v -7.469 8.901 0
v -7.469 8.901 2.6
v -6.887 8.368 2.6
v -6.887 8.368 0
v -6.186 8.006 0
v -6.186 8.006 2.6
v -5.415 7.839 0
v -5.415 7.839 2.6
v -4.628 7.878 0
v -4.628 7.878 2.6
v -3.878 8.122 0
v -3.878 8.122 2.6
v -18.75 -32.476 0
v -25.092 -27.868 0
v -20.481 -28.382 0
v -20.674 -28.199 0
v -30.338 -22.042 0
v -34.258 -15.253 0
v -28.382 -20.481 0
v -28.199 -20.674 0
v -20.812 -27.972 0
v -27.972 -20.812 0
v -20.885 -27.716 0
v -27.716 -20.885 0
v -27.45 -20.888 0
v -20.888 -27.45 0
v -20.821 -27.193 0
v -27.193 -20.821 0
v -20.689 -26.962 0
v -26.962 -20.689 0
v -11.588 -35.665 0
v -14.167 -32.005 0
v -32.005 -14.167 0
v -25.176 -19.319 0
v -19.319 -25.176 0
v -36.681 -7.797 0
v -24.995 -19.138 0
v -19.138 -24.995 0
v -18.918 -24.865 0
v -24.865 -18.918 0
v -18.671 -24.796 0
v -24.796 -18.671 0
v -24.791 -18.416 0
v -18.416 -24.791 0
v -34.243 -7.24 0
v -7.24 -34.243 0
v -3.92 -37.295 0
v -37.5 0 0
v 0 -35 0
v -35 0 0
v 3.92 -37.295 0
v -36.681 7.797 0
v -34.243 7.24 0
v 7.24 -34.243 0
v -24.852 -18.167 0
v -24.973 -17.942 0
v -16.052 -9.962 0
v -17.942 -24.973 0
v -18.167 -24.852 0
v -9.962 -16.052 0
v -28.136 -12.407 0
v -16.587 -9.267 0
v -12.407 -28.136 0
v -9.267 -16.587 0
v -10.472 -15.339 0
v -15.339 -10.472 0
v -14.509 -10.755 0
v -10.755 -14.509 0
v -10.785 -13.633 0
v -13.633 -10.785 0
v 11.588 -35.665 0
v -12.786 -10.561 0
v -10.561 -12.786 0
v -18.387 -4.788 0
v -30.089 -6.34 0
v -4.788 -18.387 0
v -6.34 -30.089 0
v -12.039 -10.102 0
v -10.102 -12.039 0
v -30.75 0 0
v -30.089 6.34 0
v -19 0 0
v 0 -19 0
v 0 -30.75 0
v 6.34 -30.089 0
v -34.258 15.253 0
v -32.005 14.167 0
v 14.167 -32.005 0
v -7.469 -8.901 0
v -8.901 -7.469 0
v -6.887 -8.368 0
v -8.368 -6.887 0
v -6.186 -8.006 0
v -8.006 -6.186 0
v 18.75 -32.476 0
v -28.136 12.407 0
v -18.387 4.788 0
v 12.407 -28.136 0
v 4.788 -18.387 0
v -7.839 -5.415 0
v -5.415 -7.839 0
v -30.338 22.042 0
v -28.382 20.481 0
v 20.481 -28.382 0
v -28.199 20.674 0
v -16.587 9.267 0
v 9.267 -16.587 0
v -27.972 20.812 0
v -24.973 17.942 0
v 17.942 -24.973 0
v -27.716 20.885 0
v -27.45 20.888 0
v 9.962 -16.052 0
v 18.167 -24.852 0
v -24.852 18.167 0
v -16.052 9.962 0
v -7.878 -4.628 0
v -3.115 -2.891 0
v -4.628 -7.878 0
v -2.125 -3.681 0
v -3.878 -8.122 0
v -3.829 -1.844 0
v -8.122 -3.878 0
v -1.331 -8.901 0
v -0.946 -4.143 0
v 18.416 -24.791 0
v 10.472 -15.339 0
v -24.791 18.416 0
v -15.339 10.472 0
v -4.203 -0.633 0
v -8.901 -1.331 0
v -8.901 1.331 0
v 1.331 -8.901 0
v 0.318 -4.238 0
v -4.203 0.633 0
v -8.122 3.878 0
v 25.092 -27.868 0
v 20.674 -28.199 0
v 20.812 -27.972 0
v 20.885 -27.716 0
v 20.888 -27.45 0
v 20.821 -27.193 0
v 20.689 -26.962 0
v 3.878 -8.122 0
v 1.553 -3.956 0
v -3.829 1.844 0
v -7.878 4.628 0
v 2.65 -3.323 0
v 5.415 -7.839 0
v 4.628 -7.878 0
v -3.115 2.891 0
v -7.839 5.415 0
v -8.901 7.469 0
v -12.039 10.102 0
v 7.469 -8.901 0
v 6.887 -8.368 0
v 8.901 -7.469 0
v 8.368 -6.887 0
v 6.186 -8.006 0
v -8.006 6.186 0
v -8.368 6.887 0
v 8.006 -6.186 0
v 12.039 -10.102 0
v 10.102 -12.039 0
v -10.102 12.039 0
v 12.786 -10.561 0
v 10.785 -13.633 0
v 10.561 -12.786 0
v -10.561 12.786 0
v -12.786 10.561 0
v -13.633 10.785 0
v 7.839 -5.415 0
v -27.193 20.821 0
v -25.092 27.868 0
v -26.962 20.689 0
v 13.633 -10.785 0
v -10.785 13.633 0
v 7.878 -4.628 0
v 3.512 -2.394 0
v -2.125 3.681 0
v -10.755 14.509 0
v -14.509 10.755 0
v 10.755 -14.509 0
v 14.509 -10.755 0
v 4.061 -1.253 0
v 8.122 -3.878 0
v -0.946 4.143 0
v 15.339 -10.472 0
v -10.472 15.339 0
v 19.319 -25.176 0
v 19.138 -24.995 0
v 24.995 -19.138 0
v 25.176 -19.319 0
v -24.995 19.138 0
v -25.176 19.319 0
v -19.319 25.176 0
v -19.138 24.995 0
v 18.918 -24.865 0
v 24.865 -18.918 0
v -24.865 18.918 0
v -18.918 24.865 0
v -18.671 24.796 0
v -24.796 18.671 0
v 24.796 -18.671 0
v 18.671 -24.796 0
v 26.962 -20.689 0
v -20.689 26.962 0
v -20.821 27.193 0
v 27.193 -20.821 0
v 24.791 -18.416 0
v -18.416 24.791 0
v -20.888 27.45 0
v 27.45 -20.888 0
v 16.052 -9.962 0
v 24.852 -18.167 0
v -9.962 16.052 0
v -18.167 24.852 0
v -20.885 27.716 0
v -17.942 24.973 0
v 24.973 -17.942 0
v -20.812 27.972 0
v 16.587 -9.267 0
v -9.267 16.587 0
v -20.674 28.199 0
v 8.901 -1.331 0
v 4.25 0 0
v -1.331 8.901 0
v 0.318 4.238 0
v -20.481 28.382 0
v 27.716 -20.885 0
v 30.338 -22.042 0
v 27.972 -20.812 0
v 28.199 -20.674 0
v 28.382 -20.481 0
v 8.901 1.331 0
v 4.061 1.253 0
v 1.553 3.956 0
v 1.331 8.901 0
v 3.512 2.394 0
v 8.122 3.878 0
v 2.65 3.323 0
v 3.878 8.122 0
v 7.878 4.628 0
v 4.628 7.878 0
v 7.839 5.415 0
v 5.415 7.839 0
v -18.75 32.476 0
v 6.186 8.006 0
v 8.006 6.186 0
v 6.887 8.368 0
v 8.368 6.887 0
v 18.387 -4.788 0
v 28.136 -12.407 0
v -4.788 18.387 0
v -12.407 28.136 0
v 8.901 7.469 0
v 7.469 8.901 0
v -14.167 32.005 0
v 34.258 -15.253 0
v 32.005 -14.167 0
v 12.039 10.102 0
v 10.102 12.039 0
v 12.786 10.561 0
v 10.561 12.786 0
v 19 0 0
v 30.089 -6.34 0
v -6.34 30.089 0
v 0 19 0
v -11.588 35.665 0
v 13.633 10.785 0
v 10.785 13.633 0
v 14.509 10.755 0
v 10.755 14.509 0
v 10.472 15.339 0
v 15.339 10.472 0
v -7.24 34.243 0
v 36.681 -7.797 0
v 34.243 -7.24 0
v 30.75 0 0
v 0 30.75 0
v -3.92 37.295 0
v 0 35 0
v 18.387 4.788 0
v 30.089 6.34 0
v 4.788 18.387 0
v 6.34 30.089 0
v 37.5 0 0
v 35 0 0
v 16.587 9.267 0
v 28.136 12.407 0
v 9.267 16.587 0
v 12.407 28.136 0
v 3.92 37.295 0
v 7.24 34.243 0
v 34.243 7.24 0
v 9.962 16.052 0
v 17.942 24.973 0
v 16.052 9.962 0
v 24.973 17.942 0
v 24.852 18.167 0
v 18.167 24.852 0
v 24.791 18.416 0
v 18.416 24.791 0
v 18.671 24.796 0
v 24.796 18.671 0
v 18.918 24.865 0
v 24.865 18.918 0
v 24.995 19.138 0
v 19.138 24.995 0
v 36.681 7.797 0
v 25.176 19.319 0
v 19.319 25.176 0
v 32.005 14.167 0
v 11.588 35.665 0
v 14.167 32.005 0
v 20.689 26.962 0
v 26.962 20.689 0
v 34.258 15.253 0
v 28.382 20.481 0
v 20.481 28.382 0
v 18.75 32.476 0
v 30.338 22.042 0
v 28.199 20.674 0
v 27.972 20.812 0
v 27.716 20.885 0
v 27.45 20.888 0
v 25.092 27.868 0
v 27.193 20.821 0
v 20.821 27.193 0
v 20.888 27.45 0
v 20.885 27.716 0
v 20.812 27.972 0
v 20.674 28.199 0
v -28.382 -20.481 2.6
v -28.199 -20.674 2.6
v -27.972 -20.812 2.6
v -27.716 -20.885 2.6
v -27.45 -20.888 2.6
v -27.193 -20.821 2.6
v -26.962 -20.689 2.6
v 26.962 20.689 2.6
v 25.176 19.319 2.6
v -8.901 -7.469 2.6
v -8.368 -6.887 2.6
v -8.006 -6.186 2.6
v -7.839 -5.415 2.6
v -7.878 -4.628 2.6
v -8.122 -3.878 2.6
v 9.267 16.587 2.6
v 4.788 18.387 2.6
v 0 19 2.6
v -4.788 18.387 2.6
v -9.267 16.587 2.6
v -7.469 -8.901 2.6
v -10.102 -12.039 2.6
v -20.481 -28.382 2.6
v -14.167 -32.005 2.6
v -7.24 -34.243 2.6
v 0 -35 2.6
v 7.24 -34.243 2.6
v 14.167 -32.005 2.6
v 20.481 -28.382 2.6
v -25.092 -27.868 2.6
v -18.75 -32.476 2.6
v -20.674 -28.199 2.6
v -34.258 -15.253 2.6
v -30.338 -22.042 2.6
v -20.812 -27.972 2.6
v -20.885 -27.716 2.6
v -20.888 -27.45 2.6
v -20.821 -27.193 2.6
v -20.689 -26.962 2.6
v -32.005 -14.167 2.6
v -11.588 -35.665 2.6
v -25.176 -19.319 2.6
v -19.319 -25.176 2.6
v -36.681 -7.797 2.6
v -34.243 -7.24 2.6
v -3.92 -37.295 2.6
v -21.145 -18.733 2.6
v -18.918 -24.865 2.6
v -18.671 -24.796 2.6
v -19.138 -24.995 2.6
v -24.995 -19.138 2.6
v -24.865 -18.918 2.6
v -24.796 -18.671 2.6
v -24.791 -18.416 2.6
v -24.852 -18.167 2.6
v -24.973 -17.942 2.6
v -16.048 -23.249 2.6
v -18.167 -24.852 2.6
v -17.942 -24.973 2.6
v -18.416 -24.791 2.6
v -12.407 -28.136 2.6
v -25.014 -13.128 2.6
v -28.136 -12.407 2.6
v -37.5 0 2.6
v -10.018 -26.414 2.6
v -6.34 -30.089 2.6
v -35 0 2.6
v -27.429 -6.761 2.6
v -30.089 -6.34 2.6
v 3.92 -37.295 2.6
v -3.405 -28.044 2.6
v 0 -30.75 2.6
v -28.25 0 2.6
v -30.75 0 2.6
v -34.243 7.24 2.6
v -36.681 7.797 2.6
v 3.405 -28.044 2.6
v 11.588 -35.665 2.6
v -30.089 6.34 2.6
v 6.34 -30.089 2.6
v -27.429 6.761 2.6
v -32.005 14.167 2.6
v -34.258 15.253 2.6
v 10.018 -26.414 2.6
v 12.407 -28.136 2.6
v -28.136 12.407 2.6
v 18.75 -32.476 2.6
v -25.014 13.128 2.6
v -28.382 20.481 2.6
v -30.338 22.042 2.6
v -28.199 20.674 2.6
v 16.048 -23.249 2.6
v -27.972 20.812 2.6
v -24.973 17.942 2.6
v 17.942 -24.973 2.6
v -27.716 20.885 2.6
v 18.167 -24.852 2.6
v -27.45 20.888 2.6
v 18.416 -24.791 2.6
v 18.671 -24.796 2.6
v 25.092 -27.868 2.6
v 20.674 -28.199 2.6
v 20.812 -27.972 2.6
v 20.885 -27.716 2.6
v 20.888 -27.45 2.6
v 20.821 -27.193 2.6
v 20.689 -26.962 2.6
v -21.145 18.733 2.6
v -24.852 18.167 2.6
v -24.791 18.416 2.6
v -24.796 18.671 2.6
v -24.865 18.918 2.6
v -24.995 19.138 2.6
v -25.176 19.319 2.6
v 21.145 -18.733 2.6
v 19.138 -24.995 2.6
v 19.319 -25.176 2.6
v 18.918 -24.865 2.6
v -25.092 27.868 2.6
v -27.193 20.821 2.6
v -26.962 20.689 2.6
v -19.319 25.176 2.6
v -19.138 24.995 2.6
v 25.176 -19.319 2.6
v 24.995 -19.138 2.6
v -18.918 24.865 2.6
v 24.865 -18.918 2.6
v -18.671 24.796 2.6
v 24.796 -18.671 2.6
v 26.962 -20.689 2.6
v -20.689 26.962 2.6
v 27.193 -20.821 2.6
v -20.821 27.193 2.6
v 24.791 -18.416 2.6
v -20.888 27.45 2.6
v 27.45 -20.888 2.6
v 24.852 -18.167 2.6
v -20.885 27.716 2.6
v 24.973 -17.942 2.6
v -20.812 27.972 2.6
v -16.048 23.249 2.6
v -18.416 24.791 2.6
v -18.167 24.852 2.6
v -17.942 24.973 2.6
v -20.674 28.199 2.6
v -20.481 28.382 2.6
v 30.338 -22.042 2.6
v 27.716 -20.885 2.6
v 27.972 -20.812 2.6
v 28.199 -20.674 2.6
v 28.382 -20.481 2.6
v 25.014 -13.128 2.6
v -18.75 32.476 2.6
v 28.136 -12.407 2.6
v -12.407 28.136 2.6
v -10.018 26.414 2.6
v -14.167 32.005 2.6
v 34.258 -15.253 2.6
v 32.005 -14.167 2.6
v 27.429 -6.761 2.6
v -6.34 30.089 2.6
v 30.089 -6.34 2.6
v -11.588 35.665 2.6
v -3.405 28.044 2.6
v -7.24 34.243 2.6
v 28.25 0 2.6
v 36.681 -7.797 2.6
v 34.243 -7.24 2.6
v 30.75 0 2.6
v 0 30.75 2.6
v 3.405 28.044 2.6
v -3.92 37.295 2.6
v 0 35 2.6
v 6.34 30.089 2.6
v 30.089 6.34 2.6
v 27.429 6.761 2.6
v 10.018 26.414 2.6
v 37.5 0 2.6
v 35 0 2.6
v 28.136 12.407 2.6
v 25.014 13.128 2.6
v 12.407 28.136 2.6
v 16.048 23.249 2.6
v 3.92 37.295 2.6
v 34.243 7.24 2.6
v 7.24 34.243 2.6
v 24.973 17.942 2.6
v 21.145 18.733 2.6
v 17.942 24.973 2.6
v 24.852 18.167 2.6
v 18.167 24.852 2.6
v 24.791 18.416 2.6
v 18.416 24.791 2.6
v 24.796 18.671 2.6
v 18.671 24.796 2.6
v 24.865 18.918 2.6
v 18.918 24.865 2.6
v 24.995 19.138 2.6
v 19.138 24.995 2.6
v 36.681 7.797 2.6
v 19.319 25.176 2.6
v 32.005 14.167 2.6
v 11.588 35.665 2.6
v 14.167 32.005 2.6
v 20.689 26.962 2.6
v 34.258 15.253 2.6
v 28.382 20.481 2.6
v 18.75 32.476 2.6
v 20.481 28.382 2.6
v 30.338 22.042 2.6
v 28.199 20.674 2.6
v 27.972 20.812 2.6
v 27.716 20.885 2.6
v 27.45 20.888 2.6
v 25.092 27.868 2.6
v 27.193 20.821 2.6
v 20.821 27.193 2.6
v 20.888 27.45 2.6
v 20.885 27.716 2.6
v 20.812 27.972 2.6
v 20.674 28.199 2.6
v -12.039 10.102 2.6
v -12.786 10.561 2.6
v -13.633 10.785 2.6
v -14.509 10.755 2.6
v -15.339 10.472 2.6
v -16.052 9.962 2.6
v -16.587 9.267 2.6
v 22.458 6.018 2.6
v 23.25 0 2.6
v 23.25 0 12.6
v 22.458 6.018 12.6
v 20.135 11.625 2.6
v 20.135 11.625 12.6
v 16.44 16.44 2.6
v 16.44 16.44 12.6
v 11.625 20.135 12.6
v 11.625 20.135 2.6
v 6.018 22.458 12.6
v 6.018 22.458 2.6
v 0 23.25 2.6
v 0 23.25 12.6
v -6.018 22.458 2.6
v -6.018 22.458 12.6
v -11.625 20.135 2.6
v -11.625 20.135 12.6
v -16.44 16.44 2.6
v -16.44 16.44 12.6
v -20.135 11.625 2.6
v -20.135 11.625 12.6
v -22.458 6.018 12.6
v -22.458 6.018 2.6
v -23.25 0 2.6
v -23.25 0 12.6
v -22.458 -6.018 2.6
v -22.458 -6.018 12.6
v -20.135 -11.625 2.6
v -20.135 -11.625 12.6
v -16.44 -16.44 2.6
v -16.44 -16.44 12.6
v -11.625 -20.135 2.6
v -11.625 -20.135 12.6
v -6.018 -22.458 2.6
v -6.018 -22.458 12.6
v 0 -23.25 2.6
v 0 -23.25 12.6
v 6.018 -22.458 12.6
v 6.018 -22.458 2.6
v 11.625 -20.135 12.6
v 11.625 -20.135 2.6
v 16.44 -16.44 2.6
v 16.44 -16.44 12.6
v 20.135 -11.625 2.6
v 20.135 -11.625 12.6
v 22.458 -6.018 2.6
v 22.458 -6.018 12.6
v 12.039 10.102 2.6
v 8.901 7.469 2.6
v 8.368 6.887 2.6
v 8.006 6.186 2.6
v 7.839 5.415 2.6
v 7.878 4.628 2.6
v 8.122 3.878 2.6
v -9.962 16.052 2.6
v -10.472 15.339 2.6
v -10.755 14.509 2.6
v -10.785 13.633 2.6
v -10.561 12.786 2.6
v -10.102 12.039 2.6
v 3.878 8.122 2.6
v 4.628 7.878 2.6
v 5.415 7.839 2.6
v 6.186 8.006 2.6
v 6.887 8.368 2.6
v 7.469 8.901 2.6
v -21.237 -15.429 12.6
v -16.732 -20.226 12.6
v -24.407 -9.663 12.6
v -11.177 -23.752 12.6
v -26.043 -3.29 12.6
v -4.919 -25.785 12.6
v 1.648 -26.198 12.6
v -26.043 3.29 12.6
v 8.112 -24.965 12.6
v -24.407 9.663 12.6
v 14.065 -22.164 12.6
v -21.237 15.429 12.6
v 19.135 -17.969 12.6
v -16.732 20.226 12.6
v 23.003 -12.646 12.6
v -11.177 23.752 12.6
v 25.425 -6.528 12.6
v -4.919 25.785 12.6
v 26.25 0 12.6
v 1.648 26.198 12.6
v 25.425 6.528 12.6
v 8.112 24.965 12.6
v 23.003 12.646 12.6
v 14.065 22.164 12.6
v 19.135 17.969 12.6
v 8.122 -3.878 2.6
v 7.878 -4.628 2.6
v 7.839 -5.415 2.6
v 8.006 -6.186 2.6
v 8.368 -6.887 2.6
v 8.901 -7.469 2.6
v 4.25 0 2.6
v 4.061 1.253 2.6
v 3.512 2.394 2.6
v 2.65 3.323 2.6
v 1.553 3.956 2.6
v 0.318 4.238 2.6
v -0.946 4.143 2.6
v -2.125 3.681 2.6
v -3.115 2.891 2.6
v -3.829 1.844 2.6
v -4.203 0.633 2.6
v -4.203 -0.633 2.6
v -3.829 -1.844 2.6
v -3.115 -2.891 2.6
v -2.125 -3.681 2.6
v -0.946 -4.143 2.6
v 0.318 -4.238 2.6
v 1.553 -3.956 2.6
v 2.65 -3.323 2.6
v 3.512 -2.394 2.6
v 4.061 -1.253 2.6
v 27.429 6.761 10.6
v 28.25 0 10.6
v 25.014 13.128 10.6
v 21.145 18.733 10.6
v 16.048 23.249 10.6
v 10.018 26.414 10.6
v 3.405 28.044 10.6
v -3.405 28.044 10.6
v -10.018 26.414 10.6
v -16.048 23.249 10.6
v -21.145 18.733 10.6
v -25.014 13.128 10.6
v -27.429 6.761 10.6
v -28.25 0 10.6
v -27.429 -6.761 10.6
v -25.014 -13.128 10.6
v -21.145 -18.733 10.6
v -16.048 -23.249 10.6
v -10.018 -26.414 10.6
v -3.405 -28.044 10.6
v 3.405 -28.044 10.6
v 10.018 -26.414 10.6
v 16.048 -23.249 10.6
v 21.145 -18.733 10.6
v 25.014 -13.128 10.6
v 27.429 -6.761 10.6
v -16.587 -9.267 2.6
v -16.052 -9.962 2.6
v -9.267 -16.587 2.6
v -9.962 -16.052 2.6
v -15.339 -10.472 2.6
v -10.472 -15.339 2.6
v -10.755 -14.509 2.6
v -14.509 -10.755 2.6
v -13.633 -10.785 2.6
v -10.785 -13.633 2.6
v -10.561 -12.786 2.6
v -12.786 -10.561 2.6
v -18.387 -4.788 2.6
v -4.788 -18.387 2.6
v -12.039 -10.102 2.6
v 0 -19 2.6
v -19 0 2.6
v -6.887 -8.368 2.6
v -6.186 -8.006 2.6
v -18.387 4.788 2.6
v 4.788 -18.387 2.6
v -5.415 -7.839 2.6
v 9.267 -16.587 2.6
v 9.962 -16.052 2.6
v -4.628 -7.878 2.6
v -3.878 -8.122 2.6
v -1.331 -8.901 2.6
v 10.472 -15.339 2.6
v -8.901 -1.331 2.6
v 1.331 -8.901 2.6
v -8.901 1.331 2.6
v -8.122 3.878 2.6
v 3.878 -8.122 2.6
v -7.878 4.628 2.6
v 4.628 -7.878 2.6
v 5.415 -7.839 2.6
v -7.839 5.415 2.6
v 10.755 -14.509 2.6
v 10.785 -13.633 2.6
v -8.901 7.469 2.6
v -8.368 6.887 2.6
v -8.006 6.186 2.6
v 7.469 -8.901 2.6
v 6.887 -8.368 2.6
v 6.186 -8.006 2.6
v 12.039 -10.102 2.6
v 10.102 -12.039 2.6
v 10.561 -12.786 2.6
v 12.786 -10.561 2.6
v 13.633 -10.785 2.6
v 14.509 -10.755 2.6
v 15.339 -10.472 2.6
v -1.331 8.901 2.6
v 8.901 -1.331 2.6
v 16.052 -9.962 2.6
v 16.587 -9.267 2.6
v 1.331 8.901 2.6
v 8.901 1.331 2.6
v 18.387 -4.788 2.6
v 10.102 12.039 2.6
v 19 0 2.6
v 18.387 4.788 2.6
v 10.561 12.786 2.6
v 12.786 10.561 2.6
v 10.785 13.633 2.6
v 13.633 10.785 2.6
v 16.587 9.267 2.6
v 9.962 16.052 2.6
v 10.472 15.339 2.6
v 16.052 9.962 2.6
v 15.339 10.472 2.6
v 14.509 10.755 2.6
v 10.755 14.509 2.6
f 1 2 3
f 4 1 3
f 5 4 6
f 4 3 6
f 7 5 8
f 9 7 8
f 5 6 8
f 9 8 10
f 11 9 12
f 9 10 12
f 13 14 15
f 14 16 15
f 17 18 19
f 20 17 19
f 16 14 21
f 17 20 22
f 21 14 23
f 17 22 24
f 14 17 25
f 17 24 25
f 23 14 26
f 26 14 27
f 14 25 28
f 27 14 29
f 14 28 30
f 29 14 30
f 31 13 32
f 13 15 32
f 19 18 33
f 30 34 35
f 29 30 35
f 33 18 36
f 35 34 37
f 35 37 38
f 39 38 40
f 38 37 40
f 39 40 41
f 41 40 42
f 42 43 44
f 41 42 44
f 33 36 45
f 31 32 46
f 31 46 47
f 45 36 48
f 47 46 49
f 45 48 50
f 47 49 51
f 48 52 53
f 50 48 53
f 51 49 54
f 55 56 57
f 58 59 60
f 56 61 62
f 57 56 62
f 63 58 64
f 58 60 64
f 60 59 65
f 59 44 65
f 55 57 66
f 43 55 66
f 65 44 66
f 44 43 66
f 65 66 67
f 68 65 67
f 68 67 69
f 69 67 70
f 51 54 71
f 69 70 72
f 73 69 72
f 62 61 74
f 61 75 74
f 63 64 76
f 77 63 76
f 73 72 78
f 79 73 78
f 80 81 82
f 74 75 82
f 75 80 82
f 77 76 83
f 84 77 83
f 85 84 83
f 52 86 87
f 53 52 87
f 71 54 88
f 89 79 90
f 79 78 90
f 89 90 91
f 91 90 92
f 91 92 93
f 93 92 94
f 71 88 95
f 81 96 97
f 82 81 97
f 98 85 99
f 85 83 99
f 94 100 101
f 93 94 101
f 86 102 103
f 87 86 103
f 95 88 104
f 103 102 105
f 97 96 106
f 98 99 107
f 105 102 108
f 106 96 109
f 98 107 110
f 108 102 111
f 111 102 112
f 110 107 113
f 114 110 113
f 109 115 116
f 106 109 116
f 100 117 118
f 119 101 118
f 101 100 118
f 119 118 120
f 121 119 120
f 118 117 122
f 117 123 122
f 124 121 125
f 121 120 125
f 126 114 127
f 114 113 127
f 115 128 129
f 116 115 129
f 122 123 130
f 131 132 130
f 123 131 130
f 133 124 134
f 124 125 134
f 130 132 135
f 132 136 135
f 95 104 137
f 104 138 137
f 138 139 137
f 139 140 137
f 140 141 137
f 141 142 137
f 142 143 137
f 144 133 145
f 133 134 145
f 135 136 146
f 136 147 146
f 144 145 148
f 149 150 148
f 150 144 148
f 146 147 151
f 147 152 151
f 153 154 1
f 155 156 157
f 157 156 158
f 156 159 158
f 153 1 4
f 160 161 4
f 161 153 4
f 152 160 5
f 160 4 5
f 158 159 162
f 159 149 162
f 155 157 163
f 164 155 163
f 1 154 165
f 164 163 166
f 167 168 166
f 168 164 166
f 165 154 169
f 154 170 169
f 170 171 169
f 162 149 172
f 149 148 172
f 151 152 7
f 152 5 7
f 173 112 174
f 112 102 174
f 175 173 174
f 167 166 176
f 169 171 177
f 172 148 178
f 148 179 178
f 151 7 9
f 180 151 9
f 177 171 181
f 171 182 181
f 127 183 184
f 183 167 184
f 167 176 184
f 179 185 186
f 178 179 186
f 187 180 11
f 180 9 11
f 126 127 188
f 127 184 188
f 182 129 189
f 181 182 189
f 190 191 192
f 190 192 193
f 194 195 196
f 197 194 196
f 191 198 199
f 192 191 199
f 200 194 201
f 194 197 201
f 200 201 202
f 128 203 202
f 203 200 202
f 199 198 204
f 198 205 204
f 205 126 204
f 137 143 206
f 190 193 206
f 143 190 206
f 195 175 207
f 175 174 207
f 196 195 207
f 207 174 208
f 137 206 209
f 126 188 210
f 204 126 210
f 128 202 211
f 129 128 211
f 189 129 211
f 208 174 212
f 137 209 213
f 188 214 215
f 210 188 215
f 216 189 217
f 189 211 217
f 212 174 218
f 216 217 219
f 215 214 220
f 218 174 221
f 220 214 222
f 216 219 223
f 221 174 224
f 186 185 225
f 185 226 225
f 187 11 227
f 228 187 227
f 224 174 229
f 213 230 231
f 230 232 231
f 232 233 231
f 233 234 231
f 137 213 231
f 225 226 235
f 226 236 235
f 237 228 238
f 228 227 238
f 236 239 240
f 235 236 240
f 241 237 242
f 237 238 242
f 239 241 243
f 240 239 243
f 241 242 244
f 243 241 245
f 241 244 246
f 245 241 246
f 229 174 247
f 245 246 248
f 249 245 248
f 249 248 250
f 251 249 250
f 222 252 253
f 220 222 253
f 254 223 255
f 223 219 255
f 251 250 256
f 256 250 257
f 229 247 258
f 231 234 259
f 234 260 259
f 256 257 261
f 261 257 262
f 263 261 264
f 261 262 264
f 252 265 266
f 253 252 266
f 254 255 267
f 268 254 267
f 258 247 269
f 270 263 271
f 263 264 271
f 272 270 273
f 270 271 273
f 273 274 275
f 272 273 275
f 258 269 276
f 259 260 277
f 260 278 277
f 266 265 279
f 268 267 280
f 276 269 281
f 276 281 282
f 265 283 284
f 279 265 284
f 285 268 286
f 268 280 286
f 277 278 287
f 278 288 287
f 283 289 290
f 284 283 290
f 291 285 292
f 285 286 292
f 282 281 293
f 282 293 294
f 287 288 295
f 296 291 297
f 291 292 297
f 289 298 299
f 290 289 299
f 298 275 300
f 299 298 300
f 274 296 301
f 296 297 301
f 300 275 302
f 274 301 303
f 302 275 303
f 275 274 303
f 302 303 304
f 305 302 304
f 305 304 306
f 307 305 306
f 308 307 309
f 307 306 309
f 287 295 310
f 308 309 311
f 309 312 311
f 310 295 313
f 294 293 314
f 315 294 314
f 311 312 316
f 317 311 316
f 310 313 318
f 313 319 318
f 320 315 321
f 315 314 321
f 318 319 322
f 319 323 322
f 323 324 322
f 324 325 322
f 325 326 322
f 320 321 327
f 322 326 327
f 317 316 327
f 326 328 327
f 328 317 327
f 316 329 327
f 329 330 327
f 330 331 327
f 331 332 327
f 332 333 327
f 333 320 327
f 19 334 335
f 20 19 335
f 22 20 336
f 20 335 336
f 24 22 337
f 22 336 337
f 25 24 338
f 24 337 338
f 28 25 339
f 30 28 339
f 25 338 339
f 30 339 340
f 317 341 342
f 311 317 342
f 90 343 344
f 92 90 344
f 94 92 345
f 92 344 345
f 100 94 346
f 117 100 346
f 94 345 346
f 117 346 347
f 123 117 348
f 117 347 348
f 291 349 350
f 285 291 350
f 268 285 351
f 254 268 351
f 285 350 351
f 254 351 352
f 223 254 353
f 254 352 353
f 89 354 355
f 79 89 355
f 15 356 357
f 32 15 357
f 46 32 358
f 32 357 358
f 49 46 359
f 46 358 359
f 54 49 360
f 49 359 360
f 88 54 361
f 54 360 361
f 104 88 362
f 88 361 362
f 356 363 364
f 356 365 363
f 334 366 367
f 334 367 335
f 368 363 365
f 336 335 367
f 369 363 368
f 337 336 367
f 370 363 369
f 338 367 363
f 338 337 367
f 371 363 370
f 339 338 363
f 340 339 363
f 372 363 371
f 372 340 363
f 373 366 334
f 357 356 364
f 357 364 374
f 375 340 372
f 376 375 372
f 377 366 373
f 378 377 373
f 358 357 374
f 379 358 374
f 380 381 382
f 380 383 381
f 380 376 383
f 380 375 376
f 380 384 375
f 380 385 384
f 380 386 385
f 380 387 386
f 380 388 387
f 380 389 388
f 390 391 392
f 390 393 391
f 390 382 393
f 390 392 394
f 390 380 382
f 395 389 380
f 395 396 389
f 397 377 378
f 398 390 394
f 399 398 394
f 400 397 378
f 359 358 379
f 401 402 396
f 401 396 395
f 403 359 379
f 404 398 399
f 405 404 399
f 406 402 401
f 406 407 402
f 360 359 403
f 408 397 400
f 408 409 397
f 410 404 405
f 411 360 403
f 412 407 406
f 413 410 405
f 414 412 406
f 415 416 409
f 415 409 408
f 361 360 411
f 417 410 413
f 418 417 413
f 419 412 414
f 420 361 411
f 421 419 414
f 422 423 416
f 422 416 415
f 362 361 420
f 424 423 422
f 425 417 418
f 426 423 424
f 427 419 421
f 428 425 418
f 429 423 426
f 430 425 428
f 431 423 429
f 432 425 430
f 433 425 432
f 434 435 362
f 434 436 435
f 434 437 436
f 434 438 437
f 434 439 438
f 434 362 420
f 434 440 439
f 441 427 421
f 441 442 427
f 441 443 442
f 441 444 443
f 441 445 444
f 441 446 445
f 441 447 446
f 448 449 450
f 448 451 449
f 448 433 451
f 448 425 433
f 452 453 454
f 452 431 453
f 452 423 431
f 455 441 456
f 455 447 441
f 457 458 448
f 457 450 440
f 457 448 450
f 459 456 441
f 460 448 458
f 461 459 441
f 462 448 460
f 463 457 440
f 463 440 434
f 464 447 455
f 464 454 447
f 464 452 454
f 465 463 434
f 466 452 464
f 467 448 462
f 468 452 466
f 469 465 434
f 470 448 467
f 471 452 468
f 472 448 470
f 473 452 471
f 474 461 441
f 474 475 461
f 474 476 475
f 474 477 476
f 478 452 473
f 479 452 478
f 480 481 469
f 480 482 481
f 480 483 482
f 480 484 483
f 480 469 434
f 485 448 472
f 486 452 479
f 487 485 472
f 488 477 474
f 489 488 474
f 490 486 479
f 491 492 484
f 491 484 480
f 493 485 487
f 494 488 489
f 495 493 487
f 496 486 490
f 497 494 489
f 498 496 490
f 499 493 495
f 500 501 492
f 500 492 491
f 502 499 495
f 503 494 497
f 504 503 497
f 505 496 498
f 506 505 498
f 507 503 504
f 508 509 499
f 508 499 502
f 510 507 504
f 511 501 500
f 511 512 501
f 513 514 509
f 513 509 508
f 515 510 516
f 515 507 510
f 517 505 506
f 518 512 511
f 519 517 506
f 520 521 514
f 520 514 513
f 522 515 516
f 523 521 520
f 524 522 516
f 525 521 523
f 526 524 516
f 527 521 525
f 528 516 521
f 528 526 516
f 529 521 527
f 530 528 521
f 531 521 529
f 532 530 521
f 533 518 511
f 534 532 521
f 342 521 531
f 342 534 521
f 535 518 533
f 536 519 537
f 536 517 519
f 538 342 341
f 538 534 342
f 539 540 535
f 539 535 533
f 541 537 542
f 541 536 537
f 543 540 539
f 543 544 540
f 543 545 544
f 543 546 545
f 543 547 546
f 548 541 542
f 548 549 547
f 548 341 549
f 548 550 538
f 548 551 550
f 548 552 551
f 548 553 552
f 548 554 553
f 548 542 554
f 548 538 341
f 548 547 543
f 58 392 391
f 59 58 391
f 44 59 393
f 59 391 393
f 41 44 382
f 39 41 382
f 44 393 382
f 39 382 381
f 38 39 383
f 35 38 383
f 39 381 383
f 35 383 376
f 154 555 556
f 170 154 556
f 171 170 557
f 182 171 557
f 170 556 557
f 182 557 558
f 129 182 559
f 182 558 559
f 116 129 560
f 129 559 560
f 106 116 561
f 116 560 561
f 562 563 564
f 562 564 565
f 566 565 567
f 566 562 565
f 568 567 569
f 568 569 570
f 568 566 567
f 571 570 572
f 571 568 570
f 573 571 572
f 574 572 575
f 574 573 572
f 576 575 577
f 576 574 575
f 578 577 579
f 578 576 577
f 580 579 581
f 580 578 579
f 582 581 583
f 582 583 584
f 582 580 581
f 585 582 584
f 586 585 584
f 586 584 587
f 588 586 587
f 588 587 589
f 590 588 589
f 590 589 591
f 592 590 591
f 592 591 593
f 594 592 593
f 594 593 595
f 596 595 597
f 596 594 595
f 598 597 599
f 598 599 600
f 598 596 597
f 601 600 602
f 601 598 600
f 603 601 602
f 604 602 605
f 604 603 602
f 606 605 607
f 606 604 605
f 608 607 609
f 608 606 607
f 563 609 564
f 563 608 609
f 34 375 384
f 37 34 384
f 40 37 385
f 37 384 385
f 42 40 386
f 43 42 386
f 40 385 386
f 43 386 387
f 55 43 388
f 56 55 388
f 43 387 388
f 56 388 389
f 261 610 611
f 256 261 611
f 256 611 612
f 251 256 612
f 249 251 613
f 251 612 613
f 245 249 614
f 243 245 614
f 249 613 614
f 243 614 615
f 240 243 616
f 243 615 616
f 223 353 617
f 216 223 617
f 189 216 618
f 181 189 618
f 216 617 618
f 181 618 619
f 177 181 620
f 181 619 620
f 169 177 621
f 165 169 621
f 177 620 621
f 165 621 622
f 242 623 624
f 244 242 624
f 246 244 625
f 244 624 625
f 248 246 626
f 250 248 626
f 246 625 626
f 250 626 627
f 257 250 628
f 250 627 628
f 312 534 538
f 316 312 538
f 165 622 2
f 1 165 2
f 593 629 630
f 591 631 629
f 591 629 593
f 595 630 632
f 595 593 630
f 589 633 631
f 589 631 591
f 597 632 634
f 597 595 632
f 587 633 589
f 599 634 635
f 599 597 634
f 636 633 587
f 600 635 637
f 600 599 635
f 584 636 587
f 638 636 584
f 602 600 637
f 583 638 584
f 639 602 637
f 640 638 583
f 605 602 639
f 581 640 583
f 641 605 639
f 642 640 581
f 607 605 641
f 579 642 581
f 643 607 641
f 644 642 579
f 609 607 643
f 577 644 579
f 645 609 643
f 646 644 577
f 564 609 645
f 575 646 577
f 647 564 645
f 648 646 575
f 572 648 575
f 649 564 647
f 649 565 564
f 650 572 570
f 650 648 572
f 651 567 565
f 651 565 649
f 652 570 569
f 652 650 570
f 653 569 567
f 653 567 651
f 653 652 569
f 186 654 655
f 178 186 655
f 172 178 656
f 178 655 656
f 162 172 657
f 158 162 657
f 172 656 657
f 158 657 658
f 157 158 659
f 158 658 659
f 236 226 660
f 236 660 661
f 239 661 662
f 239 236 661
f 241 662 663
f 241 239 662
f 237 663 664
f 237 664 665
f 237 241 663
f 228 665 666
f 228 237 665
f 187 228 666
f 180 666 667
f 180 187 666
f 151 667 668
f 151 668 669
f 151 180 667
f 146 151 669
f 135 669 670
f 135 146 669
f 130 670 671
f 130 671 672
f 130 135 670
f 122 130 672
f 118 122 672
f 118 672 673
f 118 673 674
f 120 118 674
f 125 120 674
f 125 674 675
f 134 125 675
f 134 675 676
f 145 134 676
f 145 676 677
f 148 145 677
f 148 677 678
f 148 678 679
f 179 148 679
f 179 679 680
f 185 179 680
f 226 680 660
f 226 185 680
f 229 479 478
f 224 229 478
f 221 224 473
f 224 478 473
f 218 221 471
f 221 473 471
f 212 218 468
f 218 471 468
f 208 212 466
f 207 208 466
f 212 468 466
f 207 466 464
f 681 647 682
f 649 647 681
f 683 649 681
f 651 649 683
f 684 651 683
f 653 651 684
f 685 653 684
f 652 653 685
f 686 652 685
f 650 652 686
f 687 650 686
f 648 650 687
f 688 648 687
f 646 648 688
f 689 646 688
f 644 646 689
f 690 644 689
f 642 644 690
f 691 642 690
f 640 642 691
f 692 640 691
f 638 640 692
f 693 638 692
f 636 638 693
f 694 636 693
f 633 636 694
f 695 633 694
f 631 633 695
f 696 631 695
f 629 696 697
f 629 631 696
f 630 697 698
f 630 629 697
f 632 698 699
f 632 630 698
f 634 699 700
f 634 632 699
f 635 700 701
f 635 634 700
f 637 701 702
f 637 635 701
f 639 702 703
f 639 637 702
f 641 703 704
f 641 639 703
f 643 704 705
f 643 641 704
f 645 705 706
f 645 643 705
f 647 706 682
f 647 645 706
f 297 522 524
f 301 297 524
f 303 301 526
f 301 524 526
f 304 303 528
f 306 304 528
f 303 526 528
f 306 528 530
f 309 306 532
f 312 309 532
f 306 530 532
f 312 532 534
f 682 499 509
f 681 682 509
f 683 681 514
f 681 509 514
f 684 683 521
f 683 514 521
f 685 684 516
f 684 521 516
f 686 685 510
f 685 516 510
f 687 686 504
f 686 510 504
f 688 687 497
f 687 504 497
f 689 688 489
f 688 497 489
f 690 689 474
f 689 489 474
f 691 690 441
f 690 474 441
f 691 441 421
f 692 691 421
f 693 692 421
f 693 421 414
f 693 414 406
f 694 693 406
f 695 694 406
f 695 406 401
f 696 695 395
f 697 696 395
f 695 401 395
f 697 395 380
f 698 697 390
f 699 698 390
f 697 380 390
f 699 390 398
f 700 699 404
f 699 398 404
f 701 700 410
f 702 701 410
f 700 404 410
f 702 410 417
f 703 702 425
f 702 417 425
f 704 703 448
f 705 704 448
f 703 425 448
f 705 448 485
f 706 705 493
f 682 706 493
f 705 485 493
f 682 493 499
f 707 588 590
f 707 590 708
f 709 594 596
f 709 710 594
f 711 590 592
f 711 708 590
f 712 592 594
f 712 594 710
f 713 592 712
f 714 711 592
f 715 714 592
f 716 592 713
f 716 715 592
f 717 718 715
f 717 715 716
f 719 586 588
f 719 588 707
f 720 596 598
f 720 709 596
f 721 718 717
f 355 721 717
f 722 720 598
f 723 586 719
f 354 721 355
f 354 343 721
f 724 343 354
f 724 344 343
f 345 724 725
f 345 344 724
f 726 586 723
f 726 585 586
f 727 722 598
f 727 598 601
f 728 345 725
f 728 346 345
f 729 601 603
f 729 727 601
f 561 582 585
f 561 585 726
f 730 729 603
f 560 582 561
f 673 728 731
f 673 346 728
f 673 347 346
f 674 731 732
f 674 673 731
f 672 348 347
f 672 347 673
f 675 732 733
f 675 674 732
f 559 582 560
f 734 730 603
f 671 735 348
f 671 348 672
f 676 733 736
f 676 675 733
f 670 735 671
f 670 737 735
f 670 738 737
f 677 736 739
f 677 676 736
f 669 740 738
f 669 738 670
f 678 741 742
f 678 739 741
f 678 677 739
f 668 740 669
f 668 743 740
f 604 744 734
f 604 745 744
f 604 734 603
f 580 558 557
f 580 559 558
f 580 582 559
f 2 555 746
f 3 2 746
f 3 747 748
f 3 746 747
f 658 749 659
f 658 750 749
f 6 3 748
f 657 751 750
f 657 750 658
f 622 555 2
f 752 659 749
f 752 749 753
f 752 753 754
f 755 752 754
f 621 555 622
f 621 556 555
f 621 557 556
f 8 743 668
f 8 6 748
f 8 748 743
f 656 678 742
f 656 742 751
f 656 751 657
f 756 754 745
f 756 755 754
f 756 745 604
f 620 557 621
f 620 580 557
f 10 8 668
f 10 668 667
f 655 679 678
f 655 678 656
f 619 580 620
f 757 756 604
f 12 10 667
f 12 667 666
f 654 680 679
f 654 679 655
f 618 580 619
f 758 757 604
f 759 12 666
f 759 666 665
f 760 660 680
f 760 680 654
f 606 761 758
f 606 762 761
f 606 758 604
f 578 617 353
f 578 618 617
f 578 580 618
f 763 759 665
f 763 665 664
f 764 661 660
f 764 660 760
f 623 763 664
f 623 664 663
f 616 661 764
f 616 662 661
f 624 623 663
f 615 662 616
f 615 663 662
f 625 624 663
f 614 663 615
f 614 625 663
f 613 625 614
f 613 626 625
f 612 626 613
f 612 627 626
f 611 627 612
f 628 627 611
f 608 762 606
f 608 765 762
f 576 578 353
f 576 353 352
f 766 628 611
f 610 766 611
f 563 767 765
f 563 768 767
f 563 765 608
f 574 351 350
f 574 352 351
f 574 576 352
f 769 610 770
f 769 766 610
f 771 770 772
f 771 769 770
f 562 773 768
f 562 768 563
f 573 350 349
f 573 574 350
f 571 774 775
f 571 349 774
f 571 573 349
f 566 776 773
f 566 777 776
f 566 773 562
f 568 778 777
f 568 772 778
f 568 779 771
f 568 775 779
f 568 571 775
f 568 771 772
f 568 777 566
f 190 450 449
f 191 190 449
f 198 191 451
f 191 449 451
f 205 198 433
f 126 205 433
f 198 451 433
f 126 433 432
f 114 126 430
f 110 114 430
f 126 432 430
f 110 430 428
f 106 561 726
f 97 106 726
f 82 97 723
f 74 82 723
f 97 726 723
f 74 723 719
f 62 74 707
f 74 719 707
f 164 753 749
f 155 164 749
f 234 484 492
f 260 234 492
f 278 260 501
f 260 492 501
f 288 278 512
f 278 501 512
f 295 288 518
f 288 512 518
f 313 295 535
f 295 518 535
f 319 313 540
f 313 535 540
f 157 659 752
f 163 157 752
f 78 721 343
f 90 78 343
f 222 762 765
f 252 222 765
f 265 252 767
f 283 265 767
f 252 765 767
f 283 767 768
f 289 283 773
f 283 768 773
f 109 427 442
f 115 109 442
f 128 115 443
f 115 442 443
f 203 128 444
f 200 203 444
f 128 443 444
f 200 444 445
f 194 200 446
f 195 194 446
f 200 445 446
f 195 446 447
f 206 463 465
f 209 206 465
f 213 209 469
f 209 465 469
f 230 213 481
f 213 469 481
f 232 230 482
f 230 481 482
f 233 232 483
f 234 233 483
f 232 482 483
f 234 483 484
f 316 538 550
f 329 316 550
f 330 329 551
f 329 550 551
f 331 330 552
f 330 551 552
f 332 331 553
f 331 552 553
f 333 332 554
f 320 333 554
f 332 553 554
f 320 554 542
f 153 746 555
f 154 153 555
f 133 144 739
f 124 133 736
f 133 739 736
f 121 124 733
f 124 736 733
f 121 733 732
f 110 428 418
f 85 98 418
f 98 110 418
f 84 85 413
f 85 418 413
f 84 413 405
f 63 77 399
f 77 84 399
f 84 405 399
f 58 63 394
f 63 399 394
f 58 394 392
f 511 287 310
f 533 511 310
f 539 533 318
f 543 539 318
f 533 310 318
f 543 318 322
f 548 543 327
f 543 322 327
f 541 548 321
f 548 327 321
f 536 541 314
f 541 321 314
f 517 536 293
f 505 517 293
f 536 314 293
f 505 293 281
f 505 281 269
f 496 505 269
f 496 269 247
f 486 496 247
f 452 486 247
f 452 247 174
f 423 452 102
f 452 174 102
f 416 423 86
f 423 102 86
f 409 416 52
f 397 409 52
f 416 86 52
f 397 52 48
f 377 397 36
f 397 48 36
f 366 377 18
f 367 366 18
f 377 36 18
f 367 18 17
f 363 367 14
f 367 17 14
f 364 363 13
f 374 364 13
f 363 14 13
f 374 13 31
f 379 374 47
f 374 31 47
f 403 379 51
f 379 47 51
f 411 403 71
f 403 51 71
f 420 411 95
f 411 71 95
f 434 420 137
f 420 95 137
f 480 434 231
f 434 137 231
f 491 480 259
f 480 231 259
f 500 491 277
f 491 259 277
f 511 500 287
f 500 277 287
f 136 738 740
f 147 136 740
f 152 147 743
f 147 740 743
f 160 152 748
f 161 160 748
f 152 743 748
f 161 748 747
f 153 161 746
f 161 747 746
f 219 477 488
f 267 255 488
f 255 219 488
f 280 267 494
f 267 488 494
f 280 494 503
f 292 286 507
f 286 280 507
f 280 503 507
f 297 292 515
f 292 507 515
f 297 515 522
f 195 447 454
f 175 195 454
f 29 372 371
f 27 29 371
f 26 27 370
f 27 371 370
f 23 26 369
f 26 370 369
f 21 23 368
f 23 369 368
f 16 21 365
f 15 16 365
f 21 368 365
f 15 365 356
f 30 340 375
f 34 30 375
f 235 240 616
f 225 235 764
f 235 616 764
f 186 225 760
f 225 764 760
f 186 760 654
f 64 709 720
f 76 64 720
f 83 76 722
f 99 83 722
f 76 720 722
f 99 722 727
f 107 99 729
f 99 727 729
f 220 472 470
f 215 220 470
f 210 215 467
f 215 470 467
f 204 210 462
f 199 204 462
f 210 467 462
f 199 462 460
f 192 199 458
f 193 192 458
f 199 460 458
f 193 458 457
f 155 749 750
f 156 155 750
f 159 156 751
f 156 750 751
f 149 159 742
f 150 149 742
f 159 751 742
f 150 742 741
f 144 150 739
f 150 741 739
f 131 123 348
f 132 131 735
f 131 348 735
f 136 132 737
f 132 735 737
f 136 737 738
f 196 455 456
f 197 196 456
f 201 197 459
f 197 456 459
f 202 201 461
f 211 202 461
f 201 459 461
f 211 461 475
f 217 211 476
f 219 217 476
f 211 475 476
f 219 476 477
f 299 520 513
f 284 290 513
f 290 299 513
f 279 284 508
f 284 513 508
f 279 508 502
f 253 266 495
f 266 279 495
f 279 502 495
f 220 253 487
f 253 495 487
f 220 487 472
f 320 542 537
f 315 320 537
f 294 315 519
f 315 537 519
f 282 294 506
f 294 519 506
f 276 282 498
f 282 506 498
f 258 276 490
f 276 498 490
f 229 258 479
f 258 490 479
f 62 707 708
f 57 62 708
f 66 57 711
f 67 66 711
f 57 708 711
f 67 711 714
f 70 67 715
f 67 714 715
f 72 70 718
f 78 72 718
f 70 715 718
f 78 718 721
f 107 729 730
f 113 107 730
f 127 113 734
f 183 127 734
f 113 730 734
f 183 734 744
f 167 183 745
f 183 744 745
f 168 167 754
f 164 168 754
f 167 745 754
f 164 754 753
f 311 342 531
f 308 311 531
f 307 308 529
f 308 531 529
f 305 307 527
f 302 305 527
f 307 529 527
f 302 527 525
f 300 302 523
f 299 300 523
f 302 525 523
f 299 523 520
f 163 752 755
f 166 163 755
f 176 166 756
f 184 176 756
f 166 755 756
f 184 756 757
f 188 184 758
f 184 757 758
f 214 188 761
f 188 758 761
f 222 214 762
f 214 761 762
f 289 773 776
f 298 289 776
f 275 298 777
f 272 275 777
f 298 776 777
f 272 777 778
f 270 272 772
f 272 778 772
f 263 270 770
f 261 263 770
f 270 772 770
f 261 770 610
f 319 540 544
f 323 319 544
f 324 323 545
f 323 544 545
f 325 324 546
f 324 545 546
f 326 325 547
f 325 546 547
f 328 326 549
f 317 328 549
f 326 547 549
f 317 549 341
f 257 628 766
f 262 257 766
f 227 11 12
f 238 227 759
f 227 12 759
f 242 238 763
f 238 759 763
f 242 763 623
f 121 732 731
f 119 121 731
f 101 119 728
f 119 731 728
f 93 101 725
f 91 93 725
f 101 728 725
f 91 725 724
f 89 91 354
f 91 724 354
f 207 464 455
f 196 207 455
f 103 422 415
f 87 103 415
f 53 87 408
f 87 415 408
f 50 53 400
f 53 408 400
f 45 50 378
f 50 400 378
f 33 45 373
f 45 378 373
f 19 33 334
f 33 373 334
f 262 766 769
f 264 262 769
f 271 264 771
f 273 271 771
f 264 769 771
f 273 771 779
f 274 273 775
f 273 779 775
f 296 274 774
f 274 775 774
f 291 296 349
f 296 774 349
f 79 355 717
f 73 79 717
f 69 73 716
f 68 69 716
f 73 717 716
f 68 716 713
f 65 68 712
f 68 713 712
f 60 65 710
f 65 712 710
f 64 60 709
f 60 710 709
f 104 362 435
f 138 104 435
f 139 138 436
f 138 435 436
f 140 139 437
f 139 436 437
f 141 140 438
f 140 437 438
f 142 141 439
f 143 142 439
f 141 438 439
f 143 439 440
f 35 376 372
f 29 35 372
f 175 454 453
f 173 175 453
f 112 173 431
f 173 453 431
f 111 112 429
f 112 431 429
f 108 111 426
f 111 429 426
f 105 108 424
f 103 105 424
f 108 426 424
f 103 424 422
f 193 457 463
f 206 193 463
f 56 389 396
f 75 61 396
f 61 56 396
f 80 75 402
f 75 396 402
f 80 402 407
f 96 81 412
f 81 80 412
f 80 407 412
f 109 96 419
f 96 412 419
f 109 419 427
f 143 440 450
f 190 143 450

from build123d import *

# Parameters (mm, degrees)
F0_R      = 37.5
F0_R_2    = 23.25
F1_DEPTH  = 2.6
F2_R      = 28.25
F2_R_2    = 23.25
F3_DEPTH  = 10
F4_SIZE   = 2
F5_R      = 23.25
F5_R_2    = 4.25
F6_DEPTH  = 2.6
F8_DEPTH  = 2.601
F10_DEPTH = 2.601


with BuildPart() as f1:
    # F0 (on Top) → F1 (new body)
    with BuildSketch(Plane.XY):
        Circle(F0_R)
        Circle(F0_R_2, mode=Mode.SUBTRACT)
    extrude(amount=F1_DEPTH)

    # F2 (on face) → F3 (join)
    with BuildSketch(Plane.XY.offset(2.6)):
        Circle(F2_R)
        Circle(F2_R_2, mode=Mode.SUBTRACT)
    extrude(amount=F3_DEPTH)

    # F4
    f4_edges = [f1.edges().sort_by_distance(p)[0] for p in [
        (-28.25, 0, 12.6),
    ]]
    chamfer(f4_edges, length=F4_SIZE)

    # F5 (on Top) → F6 (join)
    with BuildSketch(Plane.XY):
        Circle(F5_R)
        Circle(F5_R_2, mode=Mode.SUBTRACT)
    extrude(amount=F6_DEPTH)

    # F7 (on face) → F8 (cut, through all)
    with BuildSketch(Plane.XY.offset(2.6)):
        with BuildLine():
            ThreePointArc((-3.877788, 8.121746), (0, 9), (3.877788, 8.121746))
            ThreePointArc((3.877788, 8.121746), (5.806341, 7.897177), (7.468517, 8.900632))
            Line((7.468517, 8.900632), (10.1022, 12.039333))
            ThreePointArc((10.1022, 12.039333), (10.754749, 14.509432), (9.267329, 16.586639))
            ThreePointArc((9.267329, 16.586639), (0, 19), (-9.267329, 16.586639))
            ThreePointArc((-9.267329, 16.586639), (-10.754749, 14.509432), (-10.1022, 12.039333))
            Line((-10.1022, 12.039333), (-7.468517, 8.900632))
            ThreePointArc((-7.468517, 8.900632), (-5.806341, 7.897177), (-3.877788, 8.121746))
        make_face()
        with BuildLine():
            Line((8.900632, -7.468517), (12.039333, -10.1022))
            ThreePointArc((12.039333, -10.1022), (14.509432, -10.754749), (16.586639, -9.267329))
            ThreePointArc((16.586639, -9.267329), (19, 0), (16.586639, 9.267329))
            ThreePointArc((16.586639, 9.267329), (14.509432, 10.754749), (12.039333, 10.1022))
            Line((12.039333, 10.1022), (8.900632, 7.468517))
            ThreePointArc((8.900632, 7.468517), (7.897177, 5.806341), (8.121746, 3.877788))
            ThreePointArc((8.121746, 3.877788), (9, 0), (8.121746, -3.877788))
            ThreePointArc((8.121746, -3.877788), (7.897177, -5.806341), (8.900632, -7.468517))
        make_face()
        with BuildLine():
            Line((-7.468517, -8.900632), (-10.1022, -12.039333))
            ThreePointArc((-10.1022, -12.039333), (-10.754749, -14.509432), (-9.267329, -16.586639))
            ThreePointArc((-9.267329, -16.586639), (0, -19), (9.267329, -16.586639))
            ThreePointArc((9.267329, -16.586639), (10.754749, -14.509432), (10.1022, -12.039333))
            Line((10.1022, -12.039333), (7.468517, -8.900632))
            ThreePointArc((7.468517, -8.900632), (5.806341, -7.897177), (3.877788, -8.121746))
            ThreePointArc((3.877788, -8.121746), (0, -9), (-3.877788, -8.121746))
            ThreePointArc((-3.877788, -8.121746), (-5.806341, -7.897177), (-7.468517, -8.900632))
        make_face()
        with BuildLine():
            Line((-8.900632, 7.468517), (-12.039333, 10.1022))
            ThreePointArc((-12.039333, 10.1022), (-14.509432, 10.754749), (-16.586639, 9.267329))
            ThreePointArc((-16.586639, 9.267329), (-19, 0), (-16.586639, -9.267329))
            ThreePointArc((-16.586639, -9.267329), (-14.509432, -10.754749), (-12.039333, -10.1022))
            Line((-12.039333, -10.1022), (-8.900632, -7.468517))
            ThreePointArc((-8.900632, -7.468517), (-7.897177, -5.806341), (-8.121746, -3.877788))
            ThreePointArc((-8.121746, -3.877788), (-9, 0), (-8.121746, 3.877788))
            ThreePointArc((-8.121746, 3.877788), (-7.897177, 5.806341), (-8.900632, 7.468517))
        make_face()
    extrude(amount=-F8_DEPTH, mode=Mode.SUBTRACT)

    # F9 (on face) → F10 (cut, through all)
    with BuildSketch(Plane.XY.offset(2.6)):
        with BuildLine():
            ThreePointArc((20.688934, 26.962344), (20.884999, 27.716199), (20.480745, 28.38202))
            ThreePointArc((20.480745, 28.38202), (0, 35), (-20.480745, 28.38202))
            ThreePointArc((-20.480745, 28.38202), (-20.884999, 27.716199), (-20.688934, 26.962344))
            Line((-20.688934, 26.962344), (-19.318586, 25.176472))
            ThreePointArc((-19.318586, 25.176472), (-18.671358, 24.795967), (-17.941761, 24.9731))
            ThreePointArc((-17.941761, 24.9731), (0, 30.75), (17.941761, 24.9731))
            ThreePointArc((17.941761, 24.9731), (18.671358, 24.795967), (19.318586, 25.176472))
            Line((19.318586, 25.176472), (20.688934, 26.962344))
        make_face()
        with BuildLine():
            ThreePointArc((26.962344, -20.688934), (27.716199, -20.884999), (28.38202, -20.480745))
            ThreePointArc((28.38202, -20.480745), (35, 0), (28.38202, 20.480745))
            ThreePointArc((28.38202, 20.480745), (27.716199, 20.884999), (26.962344, 20.688934))
            Line((26.962344, 20.688934), (25.176472, 19.318586))
            ThreePointArc((25.176472, 19.318586), (24.795967, 18.671358), (24.9731, 17.941761))
            ThreePointArc((24.9731, 17.941761), (30.75, 0), (24.9731, -17.941761))
            ThreePointArc((24.9731, -17.941761), (24.795967, -18.671358), (25.176472, -19.318586))
            Line((25.176472, -19.318586), (26.962344, -20.688934))
        make_face()
        with BuildLine():
            ThreePointArc((-20.688934, -26.962344), (-20.884999, -27.716199), (-20.480745, -28.38202))
            ThreePointArc((-20.480745, -28.38202), (0, -35), (20.480745, -28.38202))
            ThreePointArc((20.480745, -28.38202), (20.884999, -27.716199), (20.688934, -26.962344))
            Line((20.688934, -26.962344), (19.318586, -25.176472))
            ThreePointArc((19.318586, -25.176472), (18.671358, -24.795967), (17.941761, -24.9731))
            ThreePointArc((17.941761, -24.9731), (0, -30.75), (-17.941761, -24.9731))
            ThreePointArc((-17.941761, -24.9731), (-18.671358, -24.795967), (-19.318586, -25.176472))
            Line((-19.318586, -25.176472), (-20.688934, -26.962344))
        make_face()
        with BuildLine():
            ThreePointArc((-26.962344, 20.688934), (-27.716199, 20.884999), (-28.38202, 20.480745))
            ThreePointArc((-28.38202, 20.480745), (-35, 0), (-28.38202, -20.480745))
            ThreePointArc((-28.38202, -20.480745), (-27.716199, -20.884999), (-26.962344, -20.688934))
            Line((-26.962344, -20.688934), (-25.176472, -19.318586))
            ThreePointArc((-25.176472, -19.318586), (-24.795967, -18.671358), (-24.9731, -17.941761))
            ThreePointArc((-24.9731, -17.941761), (-30.75, 0), (-24.9731, 17.941761))
            ThreePointArc((-24.9731, 17.941761), (-24.795967, 18.671358), (-25.176472, 19.318586))
            Line((-25.176472, 19.318586), (-26.962344, 20.688934))
        make_face()
    extrude(amount=-F10_DEPTH, mode=Mode.SUBTRACT)


solid = f1.part
